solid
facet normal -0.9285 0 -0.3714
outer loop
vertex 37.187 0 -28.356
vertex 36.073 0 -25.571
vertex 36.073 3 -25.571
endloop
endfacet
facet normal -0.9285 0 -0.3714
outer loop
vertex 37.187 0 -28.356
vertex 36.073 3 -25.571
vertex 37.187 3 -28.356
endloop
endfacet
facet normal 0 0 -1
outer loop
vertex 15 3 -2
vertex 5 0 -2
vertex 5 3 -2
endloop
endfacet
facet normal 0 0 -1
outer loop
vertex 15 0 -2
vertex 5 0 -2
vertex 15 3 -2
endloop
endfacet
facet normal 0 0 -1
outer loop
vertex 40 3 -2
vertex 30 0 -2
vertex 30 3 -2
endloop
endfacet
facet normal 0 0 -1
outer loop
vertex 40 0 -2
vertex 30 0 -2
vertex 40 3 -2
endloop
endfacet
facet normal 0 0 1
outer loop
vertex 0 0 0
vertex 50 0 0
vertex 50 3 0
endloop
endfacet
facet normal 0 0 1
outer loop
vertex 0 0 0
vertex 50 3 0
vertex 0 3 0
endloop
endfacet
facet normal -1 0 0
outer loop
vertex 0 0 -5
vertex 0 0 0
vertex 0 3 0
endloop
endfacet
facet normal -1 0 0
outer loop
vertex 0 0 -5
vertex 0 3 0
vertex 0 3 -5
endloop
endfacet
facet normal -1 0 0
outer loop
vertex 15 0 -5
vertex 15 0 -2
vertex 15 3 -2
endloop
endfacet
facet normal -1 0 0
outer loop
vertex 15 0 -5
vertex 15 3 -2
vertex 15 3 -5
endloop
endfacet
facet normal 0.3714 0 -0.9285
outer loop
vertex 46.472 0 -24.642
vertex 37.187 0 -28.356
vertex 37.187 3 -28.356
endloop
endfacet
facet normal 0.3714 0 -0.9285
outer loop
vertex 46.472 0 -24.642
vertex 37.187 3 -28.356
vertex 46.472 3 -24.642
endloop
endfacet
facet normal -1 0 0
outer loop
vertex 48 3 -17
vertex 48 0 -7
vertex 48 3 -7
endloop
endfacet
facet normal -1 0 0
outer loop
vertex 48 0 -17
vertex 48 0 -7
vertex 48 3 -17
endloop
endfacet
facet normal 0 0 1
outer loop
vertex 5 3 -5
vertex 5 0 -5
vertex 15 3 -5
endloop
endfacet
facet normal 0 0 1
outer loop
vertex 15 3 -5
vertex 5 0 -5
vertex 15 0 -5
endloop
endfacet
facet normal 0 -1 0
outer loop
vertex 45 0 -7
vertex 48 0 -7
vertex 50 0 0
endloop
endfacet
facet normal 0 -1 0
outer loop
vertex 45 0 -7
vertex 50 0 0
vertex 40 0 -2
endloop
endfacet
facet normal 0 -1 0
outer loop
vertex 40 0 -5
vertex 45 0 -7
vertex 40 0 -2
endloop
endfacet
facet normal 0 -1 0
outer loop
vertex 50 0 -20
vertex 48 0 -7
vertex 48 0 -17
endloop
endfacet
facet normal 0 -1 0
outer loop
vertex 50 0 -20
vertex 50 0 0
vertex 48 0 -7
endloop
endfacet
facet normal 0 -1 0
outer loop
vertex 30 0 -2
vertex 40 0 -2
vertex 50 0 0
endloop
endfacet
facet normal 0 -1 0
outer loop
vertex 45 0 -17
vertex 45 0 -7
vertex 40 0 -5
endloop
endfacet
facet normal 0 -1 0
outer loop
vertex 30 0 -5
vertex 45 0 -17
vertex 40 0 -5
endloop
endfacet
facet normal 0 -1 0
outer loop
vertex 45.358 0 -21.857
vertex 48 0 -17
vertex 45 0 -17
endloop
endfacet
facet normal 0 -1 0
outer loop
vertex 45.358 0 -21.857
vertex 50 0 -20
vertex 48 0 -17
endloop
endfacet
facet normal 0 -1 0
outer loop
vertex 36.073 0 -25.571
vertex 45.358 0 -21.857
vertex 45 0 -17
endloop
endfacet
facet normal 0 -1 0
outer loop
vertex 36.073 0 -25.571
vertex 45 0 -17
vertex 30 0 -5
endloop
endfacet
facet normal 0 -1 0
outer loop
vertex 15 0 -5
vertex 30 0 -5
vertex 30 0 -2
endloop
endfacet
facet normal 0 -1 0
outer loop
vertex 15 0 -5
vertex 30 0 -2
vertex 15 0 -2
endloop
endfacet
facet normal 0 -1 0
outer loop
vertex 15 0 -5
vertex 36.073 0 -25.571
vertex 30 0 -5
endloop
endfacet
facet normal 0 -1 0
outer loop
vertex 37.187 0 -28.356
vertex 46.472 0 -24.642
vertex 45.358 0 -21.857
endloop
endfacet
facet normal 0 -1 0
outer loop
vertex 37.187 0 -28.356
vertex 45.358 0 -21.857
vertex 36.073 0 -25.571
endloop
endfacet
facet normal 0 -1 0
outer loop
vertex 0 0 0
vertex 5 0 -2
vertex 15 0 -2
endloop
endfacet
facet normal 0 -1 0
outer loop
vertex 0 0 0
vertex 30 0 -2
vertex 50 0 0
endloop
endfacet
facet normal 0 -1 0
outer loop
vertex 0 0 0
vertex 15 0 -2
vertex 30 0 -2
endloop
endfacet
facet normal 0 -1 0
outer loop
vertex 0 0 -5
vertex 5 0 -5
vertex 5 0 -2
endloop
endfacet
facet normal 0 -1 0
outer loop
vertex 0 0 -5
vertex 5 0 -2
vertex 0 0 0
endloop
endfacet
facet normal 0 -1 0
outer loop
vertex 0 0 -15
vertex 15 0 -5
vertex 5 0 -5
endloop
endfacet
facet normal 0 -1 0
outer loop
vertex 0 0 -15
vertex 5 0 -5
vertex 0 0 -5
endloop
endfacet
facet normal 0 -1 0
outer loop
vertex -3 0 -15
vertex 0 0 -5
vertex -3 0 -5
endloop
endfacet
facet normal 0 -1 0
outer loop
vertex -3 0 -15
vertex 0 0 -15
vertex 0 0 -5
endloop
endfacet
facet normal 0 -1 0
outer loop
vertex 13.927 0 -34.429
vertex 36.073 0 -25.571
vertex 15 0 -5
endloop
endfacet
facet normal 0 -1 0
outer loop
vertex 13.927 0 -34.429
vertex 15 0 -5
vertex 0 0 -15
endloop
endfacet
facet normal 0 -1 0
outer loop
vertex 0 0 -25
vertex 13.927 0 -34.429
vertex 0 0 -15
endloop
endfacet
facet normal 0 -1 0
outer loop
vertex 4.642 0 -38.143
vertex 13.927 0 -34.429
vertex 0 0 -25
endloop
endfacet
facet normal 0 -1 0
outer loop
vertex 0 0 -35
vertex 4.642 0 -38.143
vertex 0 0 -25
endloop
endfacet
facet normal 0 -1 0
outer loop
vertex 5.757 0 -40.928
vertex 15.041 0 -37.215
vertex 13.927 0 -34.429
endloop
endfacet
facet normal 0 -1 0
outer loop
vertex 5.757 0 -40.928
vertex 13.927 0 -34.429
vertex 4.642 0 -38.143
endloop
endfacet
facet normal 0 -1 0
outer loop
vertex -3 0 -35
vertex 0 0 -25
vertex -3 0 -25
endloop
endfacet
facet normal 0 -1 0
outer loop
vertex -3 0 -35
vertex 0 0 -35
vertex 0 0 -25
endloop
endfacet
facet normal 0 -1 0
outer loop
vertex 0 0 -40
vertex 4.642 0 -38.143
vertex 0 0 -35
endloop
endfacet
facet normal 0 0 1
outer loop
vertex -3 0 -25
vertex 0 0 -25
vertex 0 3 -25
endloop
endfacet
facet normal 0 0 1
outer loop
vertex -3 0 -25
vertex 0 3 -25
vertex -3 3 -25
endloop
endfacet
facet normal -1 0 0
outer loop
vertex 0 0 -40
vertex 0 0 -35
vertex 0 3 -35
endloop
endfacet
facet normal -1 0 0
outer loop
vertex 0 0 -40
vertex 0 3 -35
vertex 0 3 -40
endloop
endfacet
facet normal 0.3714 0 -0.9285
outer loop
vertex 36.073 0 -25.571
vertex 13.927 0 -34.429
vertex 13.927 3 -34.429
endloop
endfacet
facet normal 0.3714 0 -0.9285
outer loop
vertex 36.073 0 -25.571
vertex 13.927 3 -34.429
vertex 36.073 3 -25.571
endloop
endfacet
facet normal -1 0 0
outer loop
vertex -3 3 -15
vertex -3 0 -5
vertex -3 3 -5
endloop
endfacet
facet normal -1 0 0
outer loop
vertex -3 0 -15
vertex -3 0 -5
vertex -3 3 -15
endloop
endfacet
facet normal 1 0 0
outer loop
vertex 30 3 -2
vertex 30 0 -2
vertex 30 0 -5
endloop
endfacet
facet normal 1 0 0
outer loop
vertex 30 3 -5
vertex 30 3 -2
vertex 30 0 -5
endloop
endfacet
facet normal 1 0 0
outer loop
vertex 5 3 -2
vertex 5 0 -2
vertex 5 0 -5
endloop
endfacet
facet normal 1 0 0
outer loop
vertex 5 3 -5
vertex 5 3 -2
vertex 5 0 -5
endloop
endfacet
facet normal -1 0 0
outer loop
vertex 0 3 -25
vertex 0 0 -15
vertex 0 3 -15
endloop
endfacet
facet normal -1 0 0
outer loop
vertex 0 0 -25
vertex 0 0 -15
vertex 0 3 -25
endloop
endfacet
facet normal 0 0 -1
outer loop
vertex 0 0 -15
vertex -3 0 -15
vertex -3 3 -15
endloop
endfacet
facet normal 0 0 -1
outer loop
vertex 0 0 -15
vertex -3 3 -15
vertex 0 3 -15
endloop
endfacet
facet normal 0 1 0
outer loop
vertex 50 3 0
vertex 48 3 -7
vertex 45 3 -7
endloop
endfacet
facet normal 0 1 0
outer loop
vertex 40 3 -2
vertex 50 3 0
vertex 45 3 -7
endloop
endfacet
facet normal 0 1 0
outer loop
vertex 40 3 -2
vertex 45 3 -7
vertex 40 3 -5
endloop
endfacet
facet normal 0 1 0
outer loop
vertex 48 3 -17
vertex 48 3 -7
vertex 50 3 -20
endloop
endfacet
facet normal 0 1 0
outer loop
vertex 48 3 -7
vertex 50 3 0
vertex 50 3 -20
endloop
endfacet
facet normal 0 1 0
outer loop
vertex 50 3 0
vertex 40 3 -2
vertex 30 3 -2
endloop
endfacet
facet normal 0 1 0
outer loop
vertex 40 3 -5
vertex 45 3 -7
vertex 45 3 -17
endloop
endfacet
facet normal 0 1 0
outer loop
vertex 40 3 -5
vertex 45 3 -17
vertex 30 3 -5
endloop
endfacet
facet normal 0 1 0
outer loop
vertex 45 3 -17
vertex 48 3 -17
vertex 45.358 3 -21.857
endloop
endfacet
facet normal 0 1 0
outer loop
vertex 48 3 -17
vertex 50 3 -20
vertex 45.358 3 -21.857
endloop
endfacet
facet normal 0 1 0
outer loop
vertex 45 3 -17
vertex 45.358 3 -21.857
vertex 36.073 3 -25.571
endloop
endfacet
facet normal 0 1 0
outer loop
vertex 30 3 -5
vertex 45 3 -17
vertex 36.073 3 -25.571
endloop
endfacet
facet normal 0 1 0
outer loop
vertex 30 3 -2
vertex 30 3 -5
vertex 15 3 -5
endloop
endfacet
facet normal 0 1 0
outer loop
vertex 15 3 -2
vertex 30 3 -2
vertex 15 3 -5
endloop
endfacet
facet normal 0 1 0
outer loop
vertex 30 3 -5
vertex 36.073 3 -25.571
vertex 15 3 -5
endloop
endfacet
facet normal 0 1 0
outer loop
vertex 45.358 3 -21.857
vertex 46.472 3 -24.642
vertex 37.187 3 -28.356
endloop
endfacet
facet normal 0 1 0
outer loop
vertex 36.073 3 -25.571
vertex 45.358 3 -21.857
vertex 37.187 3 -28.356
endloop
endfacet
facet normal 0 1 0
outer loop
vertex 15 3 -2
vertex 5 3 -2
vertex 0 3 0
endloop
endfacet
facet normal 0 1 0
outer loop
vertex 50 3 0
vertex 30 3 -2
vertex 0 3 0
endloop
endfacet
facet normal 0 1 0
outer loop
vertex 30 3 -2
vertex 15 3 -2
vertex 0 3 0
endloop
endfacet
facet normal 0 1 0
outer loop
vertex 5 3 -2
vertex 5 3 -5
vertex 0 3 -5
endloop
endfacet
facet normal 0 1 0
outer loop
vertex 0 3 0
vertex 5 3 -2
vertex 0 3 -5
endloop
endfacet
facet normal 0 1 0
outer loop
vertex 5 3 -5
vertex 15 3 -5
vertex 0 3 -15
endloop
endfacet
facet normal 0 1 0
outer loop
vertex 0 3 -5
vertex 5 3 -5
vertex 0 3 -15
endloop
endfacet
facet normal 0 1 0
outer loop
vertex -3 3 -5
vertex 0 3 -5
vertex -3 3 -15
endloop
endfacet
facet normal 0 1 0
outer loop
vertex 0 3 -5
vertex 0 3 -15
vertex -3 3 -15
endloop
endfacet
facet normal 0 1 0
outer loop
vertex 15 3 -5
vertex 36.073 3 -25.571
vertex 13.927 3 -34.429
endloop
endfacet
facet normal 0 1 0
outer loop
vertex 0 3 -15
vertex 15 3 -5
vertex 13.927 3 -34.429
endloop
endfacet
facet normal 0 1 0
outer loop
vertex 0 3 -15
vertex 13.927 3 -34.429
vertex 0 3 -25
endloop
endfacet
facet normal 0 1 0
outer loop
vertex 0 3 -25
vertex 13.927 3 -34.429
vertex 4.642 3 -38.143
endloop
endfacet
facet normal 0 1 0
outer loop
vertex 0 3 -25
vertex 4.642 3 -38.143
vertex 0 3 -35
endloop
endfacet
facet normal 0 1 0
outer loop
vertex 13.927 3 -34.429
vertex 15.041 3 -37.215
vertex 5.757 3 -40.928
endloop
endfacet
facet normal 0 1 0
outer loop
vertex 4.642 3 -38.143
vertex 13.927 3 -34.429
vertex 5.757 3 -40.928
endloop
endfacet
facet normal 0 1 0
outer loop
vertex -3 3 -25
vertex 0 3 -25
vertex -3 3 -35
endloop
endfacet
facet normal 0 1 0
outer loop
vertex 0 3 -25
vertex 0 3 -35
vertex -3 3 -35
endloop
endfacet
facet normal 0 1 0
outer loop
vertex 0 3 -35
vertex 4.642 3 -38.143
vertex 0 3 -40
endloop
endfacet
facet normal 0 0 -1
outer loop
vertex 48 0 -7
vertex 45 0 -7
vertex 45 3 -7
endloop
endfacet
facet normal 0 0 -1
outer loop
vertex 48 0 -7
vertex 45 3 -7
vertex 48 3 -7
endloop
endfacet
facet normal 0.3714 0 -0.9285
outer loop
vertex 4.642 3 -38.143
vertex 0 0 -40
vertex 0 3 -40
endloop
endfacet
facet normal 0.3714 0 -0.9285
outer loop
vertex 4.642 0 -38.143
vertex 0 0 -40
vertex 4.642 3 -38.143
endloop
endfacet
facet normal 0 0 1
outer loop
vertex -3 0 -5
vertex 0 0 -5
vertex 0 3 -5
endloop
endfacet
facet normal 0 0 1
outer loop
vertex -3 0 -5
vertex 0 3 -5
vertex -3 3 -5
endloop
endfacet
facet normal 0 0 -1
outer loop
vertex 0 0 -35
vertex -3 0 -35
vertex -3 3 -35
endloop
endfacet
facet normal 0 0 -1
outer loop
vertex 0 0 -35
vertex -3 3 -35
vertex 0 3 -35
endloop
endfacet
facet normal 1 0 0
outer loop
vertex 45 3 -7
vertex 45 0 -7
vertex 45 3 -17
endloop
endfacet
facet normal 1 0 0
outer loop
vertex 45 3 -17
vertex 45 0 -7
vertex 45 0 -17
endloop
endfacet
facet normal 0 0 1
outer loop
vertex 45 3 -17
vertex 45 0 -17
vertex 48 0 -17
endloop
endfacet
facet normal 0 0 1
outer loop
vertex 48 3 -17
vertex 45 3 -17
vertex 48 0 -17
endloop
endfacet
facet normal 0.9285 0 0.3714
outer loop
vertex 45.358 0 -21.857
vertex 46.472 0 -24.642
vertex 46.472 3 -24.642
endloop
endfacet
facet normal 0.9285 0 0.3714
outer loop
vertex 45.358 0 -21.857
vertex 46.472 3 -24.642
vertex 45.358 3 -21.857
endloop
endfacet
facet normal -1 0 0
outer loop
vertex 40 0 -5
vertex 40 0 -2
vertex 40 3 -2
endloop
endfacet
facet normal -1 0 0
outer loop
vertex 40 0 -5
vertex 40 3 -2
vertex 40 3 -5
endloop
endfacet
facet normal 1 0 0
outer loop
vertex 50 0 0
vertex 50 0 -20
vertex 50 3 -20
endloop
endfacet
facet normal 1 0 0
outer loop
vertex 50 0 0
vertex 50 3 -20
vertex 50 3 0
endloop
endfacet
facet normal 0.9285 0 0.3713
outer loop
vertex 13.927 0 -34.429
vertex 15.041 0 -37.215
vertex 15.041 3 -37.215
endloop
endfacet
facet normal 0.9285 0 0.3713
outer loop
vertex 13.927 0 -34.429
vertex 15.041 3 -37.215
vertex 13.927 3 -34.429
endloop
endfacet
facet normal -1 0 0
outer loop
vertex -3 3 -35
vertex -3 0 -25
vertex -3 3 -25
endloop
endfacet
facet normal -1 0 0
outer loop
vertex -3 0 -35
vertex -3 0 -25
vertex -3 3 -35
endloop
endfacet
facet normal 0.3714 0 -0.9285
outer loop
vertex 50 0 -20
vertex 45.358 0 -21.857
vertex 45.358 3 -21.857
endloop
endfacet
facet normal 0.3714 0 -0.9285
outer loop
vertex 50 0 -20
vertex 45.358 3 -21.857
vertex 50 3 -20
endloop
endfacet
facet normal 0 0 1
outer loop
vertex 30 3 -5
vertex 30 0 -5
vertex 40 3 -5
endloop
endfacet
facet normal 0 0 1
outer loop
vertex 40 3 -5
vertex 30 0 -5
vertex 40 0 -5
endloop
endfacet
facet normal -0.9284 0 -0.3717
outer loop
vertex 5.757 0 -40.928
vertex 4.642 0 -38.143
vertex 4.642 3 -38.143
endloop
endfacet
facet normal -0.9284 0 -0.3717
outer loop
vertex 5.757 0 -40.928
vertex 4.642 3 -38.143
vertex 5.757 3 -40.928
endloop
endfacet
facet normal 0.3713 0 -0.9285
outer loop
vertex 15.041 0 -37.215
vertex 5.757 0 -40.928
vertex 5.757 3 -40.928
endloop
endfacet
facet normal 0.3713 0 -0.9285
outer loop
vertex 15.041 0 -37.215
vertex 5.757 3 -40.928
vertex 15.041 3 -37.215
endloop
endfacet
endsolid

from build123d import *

# Parameters (mm, degrees)
SKETCH1_W           = 10
SKETCH1_H           = 3
SKETCH1_W_2         = 3
SKETCH1_H_2         = 10
BOSS_EXTRUDE1_DEPTH = 3


with BuildPart() as part:
    # Sketch1 → Boss-Extrude1 (new body)
    with BuildSketch(Plane(origin=(0, 0, 0), x_dir=(1, 0, 0), z_dir=(0, 1, 0))):
        Polygon((0, 0), (0, 5), (-3, 5), (-3, 15), (0, 15), (0, 25), (-3, 25), (-3, 35), (0, 35), (0, 40), (4.642383454, 38.143046618), (5.756555483, 40.928476691), (15.041322392, 37.214569927), (13.927150363, 34.429139855), (36.072849637, 25.570860145), (37.187021666, 28.356290218), (46.471788575, 24.642383454), (45.357616546, 21.856953382), (50, 20), (50, 0), align=None)
        with Locations((10, 3.5)):
            Rectangle(SKETCH1_W, SKETCH1_H, mode=Mode.SUBTRACT)
        with Locations((35, 3.5)):
            Rectangle(SKETCH1_W, SKETCH1_H, mode=Mode.SUBTRACT)
        with Locations((46.5, 12)):
            Rectangle(SKETCH1_W_2, SKETCH1_H_2, mode=Mode.SUBTRACT)
    extrude(amount=BOSS_EXTRUDE1_DEPTH)


solid = part.part
